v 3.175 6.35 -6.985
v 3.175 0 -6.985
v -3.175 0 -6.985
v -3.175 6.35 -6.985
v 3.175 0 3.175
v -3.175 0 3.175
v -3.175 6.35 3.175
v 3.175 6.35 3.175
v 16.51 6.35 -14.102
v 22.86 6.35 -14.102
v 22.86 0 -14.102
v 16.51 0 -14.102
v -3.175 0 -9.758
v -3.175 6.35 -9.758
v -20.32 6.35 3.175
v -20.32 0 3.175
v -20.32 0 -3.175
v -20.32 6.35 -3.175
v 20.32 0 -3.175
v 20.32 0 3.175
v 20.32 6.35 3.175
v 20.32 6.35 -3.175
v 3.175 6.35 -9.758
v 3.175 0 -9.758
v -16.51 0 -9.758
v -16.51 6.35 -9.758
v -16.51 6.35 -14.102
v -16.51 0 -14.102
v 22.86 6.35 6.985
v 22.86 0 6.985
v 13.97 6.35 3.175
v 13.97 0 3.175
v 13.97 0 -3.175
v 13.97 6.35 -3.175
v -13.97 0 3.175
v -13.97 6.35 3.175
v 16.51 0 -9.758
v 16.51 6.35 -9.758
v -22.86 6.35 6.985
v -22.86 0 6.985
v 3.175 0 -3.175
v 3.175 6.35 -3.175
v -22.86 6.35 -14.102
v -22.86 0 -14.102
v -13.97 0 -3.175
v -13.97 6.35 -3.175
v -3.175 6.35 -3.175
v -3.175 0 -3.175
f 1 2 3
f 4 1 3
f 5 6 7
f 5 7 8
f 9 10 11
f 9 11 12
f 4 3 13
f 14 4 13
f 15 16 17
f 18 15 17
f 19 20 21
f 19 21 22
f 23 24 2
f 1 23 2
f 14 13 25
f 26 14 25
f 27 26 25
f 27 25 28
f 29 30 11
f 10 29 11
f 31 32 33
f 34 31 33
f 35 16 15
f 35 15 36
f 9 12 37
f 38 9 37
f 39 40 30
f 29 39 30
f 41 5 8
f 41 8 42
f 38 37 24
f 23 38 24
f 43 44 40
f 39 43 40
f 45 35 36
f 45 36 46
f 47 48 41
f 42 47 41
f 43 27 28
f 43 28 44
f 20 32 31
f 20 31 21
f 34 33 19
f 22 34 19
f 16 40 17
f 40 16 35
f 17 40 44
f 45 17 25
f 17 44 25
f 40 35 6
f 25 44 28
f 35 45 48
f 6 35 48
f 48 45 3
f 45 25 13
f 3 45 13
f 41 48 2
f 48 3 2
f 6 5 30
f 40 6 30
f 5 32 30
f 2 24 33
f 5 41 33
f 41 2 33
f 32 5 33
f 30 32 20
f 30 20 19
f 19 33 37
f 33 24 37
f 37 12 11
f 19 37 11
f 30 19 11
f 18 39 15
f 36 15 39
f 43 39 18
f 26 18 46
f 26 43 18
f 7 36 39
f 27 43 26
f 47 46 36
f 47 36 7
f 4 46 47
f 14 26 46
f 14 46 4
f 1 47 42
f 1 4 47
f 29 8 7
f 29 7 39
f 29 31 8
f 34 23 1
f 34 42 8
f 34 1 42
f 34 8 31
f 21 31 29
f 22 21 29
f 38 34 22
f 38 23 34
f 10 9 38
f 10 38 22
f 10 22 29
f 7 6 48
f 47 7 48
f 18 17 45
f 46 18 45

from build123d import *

# Parameters (mm, degrees)
SKETCH1_W           = 6.35
SKETCH1_H           = 6.35
BOSS_EXTRUDE1_DEPTH = 6.35


with BuildPart() as part:
    # Sketch1 → Boss-Extrude1 (new body)
    with BuildSketch(Plane(origin=(0, 0, 0), x_dir=(1, 0, 0), z_dir=(0, 1, 0))):
        Polygon((-22.86, -6.985), (22.86, -6.985), (22.86, 9.757500043), (22.86, 14.102499989), (16.51, 14.102499989), (16.51, 9.757500043), (3.175, 9.757500043), (3.175, 6.985), (-3.175, 6.985), (-3.175, 9.757500043), (-16.51, 9.757500043), (-16.51, 14.102499989), (-22.86, 14.102499989), (-22.86, 9.757500043), align=None)
        Rectangle(SKETCH1_W, SKETCH1_H, mode=Mode.SUBTRACT)
        with Locations((17.145, 0)):
            Rectangle(SKETCH1_W, SKETCH1_H, mode=Mode.SUBTRACT)
        with Locations((-17.145, 0)):
            Rectangle(SKETCH1_W, SKETCH1_H, mode=Mode.SUBTRACT)
    extrude(amount=BOSS_EXTRUDE1_DEPTH)


solid = part.part
